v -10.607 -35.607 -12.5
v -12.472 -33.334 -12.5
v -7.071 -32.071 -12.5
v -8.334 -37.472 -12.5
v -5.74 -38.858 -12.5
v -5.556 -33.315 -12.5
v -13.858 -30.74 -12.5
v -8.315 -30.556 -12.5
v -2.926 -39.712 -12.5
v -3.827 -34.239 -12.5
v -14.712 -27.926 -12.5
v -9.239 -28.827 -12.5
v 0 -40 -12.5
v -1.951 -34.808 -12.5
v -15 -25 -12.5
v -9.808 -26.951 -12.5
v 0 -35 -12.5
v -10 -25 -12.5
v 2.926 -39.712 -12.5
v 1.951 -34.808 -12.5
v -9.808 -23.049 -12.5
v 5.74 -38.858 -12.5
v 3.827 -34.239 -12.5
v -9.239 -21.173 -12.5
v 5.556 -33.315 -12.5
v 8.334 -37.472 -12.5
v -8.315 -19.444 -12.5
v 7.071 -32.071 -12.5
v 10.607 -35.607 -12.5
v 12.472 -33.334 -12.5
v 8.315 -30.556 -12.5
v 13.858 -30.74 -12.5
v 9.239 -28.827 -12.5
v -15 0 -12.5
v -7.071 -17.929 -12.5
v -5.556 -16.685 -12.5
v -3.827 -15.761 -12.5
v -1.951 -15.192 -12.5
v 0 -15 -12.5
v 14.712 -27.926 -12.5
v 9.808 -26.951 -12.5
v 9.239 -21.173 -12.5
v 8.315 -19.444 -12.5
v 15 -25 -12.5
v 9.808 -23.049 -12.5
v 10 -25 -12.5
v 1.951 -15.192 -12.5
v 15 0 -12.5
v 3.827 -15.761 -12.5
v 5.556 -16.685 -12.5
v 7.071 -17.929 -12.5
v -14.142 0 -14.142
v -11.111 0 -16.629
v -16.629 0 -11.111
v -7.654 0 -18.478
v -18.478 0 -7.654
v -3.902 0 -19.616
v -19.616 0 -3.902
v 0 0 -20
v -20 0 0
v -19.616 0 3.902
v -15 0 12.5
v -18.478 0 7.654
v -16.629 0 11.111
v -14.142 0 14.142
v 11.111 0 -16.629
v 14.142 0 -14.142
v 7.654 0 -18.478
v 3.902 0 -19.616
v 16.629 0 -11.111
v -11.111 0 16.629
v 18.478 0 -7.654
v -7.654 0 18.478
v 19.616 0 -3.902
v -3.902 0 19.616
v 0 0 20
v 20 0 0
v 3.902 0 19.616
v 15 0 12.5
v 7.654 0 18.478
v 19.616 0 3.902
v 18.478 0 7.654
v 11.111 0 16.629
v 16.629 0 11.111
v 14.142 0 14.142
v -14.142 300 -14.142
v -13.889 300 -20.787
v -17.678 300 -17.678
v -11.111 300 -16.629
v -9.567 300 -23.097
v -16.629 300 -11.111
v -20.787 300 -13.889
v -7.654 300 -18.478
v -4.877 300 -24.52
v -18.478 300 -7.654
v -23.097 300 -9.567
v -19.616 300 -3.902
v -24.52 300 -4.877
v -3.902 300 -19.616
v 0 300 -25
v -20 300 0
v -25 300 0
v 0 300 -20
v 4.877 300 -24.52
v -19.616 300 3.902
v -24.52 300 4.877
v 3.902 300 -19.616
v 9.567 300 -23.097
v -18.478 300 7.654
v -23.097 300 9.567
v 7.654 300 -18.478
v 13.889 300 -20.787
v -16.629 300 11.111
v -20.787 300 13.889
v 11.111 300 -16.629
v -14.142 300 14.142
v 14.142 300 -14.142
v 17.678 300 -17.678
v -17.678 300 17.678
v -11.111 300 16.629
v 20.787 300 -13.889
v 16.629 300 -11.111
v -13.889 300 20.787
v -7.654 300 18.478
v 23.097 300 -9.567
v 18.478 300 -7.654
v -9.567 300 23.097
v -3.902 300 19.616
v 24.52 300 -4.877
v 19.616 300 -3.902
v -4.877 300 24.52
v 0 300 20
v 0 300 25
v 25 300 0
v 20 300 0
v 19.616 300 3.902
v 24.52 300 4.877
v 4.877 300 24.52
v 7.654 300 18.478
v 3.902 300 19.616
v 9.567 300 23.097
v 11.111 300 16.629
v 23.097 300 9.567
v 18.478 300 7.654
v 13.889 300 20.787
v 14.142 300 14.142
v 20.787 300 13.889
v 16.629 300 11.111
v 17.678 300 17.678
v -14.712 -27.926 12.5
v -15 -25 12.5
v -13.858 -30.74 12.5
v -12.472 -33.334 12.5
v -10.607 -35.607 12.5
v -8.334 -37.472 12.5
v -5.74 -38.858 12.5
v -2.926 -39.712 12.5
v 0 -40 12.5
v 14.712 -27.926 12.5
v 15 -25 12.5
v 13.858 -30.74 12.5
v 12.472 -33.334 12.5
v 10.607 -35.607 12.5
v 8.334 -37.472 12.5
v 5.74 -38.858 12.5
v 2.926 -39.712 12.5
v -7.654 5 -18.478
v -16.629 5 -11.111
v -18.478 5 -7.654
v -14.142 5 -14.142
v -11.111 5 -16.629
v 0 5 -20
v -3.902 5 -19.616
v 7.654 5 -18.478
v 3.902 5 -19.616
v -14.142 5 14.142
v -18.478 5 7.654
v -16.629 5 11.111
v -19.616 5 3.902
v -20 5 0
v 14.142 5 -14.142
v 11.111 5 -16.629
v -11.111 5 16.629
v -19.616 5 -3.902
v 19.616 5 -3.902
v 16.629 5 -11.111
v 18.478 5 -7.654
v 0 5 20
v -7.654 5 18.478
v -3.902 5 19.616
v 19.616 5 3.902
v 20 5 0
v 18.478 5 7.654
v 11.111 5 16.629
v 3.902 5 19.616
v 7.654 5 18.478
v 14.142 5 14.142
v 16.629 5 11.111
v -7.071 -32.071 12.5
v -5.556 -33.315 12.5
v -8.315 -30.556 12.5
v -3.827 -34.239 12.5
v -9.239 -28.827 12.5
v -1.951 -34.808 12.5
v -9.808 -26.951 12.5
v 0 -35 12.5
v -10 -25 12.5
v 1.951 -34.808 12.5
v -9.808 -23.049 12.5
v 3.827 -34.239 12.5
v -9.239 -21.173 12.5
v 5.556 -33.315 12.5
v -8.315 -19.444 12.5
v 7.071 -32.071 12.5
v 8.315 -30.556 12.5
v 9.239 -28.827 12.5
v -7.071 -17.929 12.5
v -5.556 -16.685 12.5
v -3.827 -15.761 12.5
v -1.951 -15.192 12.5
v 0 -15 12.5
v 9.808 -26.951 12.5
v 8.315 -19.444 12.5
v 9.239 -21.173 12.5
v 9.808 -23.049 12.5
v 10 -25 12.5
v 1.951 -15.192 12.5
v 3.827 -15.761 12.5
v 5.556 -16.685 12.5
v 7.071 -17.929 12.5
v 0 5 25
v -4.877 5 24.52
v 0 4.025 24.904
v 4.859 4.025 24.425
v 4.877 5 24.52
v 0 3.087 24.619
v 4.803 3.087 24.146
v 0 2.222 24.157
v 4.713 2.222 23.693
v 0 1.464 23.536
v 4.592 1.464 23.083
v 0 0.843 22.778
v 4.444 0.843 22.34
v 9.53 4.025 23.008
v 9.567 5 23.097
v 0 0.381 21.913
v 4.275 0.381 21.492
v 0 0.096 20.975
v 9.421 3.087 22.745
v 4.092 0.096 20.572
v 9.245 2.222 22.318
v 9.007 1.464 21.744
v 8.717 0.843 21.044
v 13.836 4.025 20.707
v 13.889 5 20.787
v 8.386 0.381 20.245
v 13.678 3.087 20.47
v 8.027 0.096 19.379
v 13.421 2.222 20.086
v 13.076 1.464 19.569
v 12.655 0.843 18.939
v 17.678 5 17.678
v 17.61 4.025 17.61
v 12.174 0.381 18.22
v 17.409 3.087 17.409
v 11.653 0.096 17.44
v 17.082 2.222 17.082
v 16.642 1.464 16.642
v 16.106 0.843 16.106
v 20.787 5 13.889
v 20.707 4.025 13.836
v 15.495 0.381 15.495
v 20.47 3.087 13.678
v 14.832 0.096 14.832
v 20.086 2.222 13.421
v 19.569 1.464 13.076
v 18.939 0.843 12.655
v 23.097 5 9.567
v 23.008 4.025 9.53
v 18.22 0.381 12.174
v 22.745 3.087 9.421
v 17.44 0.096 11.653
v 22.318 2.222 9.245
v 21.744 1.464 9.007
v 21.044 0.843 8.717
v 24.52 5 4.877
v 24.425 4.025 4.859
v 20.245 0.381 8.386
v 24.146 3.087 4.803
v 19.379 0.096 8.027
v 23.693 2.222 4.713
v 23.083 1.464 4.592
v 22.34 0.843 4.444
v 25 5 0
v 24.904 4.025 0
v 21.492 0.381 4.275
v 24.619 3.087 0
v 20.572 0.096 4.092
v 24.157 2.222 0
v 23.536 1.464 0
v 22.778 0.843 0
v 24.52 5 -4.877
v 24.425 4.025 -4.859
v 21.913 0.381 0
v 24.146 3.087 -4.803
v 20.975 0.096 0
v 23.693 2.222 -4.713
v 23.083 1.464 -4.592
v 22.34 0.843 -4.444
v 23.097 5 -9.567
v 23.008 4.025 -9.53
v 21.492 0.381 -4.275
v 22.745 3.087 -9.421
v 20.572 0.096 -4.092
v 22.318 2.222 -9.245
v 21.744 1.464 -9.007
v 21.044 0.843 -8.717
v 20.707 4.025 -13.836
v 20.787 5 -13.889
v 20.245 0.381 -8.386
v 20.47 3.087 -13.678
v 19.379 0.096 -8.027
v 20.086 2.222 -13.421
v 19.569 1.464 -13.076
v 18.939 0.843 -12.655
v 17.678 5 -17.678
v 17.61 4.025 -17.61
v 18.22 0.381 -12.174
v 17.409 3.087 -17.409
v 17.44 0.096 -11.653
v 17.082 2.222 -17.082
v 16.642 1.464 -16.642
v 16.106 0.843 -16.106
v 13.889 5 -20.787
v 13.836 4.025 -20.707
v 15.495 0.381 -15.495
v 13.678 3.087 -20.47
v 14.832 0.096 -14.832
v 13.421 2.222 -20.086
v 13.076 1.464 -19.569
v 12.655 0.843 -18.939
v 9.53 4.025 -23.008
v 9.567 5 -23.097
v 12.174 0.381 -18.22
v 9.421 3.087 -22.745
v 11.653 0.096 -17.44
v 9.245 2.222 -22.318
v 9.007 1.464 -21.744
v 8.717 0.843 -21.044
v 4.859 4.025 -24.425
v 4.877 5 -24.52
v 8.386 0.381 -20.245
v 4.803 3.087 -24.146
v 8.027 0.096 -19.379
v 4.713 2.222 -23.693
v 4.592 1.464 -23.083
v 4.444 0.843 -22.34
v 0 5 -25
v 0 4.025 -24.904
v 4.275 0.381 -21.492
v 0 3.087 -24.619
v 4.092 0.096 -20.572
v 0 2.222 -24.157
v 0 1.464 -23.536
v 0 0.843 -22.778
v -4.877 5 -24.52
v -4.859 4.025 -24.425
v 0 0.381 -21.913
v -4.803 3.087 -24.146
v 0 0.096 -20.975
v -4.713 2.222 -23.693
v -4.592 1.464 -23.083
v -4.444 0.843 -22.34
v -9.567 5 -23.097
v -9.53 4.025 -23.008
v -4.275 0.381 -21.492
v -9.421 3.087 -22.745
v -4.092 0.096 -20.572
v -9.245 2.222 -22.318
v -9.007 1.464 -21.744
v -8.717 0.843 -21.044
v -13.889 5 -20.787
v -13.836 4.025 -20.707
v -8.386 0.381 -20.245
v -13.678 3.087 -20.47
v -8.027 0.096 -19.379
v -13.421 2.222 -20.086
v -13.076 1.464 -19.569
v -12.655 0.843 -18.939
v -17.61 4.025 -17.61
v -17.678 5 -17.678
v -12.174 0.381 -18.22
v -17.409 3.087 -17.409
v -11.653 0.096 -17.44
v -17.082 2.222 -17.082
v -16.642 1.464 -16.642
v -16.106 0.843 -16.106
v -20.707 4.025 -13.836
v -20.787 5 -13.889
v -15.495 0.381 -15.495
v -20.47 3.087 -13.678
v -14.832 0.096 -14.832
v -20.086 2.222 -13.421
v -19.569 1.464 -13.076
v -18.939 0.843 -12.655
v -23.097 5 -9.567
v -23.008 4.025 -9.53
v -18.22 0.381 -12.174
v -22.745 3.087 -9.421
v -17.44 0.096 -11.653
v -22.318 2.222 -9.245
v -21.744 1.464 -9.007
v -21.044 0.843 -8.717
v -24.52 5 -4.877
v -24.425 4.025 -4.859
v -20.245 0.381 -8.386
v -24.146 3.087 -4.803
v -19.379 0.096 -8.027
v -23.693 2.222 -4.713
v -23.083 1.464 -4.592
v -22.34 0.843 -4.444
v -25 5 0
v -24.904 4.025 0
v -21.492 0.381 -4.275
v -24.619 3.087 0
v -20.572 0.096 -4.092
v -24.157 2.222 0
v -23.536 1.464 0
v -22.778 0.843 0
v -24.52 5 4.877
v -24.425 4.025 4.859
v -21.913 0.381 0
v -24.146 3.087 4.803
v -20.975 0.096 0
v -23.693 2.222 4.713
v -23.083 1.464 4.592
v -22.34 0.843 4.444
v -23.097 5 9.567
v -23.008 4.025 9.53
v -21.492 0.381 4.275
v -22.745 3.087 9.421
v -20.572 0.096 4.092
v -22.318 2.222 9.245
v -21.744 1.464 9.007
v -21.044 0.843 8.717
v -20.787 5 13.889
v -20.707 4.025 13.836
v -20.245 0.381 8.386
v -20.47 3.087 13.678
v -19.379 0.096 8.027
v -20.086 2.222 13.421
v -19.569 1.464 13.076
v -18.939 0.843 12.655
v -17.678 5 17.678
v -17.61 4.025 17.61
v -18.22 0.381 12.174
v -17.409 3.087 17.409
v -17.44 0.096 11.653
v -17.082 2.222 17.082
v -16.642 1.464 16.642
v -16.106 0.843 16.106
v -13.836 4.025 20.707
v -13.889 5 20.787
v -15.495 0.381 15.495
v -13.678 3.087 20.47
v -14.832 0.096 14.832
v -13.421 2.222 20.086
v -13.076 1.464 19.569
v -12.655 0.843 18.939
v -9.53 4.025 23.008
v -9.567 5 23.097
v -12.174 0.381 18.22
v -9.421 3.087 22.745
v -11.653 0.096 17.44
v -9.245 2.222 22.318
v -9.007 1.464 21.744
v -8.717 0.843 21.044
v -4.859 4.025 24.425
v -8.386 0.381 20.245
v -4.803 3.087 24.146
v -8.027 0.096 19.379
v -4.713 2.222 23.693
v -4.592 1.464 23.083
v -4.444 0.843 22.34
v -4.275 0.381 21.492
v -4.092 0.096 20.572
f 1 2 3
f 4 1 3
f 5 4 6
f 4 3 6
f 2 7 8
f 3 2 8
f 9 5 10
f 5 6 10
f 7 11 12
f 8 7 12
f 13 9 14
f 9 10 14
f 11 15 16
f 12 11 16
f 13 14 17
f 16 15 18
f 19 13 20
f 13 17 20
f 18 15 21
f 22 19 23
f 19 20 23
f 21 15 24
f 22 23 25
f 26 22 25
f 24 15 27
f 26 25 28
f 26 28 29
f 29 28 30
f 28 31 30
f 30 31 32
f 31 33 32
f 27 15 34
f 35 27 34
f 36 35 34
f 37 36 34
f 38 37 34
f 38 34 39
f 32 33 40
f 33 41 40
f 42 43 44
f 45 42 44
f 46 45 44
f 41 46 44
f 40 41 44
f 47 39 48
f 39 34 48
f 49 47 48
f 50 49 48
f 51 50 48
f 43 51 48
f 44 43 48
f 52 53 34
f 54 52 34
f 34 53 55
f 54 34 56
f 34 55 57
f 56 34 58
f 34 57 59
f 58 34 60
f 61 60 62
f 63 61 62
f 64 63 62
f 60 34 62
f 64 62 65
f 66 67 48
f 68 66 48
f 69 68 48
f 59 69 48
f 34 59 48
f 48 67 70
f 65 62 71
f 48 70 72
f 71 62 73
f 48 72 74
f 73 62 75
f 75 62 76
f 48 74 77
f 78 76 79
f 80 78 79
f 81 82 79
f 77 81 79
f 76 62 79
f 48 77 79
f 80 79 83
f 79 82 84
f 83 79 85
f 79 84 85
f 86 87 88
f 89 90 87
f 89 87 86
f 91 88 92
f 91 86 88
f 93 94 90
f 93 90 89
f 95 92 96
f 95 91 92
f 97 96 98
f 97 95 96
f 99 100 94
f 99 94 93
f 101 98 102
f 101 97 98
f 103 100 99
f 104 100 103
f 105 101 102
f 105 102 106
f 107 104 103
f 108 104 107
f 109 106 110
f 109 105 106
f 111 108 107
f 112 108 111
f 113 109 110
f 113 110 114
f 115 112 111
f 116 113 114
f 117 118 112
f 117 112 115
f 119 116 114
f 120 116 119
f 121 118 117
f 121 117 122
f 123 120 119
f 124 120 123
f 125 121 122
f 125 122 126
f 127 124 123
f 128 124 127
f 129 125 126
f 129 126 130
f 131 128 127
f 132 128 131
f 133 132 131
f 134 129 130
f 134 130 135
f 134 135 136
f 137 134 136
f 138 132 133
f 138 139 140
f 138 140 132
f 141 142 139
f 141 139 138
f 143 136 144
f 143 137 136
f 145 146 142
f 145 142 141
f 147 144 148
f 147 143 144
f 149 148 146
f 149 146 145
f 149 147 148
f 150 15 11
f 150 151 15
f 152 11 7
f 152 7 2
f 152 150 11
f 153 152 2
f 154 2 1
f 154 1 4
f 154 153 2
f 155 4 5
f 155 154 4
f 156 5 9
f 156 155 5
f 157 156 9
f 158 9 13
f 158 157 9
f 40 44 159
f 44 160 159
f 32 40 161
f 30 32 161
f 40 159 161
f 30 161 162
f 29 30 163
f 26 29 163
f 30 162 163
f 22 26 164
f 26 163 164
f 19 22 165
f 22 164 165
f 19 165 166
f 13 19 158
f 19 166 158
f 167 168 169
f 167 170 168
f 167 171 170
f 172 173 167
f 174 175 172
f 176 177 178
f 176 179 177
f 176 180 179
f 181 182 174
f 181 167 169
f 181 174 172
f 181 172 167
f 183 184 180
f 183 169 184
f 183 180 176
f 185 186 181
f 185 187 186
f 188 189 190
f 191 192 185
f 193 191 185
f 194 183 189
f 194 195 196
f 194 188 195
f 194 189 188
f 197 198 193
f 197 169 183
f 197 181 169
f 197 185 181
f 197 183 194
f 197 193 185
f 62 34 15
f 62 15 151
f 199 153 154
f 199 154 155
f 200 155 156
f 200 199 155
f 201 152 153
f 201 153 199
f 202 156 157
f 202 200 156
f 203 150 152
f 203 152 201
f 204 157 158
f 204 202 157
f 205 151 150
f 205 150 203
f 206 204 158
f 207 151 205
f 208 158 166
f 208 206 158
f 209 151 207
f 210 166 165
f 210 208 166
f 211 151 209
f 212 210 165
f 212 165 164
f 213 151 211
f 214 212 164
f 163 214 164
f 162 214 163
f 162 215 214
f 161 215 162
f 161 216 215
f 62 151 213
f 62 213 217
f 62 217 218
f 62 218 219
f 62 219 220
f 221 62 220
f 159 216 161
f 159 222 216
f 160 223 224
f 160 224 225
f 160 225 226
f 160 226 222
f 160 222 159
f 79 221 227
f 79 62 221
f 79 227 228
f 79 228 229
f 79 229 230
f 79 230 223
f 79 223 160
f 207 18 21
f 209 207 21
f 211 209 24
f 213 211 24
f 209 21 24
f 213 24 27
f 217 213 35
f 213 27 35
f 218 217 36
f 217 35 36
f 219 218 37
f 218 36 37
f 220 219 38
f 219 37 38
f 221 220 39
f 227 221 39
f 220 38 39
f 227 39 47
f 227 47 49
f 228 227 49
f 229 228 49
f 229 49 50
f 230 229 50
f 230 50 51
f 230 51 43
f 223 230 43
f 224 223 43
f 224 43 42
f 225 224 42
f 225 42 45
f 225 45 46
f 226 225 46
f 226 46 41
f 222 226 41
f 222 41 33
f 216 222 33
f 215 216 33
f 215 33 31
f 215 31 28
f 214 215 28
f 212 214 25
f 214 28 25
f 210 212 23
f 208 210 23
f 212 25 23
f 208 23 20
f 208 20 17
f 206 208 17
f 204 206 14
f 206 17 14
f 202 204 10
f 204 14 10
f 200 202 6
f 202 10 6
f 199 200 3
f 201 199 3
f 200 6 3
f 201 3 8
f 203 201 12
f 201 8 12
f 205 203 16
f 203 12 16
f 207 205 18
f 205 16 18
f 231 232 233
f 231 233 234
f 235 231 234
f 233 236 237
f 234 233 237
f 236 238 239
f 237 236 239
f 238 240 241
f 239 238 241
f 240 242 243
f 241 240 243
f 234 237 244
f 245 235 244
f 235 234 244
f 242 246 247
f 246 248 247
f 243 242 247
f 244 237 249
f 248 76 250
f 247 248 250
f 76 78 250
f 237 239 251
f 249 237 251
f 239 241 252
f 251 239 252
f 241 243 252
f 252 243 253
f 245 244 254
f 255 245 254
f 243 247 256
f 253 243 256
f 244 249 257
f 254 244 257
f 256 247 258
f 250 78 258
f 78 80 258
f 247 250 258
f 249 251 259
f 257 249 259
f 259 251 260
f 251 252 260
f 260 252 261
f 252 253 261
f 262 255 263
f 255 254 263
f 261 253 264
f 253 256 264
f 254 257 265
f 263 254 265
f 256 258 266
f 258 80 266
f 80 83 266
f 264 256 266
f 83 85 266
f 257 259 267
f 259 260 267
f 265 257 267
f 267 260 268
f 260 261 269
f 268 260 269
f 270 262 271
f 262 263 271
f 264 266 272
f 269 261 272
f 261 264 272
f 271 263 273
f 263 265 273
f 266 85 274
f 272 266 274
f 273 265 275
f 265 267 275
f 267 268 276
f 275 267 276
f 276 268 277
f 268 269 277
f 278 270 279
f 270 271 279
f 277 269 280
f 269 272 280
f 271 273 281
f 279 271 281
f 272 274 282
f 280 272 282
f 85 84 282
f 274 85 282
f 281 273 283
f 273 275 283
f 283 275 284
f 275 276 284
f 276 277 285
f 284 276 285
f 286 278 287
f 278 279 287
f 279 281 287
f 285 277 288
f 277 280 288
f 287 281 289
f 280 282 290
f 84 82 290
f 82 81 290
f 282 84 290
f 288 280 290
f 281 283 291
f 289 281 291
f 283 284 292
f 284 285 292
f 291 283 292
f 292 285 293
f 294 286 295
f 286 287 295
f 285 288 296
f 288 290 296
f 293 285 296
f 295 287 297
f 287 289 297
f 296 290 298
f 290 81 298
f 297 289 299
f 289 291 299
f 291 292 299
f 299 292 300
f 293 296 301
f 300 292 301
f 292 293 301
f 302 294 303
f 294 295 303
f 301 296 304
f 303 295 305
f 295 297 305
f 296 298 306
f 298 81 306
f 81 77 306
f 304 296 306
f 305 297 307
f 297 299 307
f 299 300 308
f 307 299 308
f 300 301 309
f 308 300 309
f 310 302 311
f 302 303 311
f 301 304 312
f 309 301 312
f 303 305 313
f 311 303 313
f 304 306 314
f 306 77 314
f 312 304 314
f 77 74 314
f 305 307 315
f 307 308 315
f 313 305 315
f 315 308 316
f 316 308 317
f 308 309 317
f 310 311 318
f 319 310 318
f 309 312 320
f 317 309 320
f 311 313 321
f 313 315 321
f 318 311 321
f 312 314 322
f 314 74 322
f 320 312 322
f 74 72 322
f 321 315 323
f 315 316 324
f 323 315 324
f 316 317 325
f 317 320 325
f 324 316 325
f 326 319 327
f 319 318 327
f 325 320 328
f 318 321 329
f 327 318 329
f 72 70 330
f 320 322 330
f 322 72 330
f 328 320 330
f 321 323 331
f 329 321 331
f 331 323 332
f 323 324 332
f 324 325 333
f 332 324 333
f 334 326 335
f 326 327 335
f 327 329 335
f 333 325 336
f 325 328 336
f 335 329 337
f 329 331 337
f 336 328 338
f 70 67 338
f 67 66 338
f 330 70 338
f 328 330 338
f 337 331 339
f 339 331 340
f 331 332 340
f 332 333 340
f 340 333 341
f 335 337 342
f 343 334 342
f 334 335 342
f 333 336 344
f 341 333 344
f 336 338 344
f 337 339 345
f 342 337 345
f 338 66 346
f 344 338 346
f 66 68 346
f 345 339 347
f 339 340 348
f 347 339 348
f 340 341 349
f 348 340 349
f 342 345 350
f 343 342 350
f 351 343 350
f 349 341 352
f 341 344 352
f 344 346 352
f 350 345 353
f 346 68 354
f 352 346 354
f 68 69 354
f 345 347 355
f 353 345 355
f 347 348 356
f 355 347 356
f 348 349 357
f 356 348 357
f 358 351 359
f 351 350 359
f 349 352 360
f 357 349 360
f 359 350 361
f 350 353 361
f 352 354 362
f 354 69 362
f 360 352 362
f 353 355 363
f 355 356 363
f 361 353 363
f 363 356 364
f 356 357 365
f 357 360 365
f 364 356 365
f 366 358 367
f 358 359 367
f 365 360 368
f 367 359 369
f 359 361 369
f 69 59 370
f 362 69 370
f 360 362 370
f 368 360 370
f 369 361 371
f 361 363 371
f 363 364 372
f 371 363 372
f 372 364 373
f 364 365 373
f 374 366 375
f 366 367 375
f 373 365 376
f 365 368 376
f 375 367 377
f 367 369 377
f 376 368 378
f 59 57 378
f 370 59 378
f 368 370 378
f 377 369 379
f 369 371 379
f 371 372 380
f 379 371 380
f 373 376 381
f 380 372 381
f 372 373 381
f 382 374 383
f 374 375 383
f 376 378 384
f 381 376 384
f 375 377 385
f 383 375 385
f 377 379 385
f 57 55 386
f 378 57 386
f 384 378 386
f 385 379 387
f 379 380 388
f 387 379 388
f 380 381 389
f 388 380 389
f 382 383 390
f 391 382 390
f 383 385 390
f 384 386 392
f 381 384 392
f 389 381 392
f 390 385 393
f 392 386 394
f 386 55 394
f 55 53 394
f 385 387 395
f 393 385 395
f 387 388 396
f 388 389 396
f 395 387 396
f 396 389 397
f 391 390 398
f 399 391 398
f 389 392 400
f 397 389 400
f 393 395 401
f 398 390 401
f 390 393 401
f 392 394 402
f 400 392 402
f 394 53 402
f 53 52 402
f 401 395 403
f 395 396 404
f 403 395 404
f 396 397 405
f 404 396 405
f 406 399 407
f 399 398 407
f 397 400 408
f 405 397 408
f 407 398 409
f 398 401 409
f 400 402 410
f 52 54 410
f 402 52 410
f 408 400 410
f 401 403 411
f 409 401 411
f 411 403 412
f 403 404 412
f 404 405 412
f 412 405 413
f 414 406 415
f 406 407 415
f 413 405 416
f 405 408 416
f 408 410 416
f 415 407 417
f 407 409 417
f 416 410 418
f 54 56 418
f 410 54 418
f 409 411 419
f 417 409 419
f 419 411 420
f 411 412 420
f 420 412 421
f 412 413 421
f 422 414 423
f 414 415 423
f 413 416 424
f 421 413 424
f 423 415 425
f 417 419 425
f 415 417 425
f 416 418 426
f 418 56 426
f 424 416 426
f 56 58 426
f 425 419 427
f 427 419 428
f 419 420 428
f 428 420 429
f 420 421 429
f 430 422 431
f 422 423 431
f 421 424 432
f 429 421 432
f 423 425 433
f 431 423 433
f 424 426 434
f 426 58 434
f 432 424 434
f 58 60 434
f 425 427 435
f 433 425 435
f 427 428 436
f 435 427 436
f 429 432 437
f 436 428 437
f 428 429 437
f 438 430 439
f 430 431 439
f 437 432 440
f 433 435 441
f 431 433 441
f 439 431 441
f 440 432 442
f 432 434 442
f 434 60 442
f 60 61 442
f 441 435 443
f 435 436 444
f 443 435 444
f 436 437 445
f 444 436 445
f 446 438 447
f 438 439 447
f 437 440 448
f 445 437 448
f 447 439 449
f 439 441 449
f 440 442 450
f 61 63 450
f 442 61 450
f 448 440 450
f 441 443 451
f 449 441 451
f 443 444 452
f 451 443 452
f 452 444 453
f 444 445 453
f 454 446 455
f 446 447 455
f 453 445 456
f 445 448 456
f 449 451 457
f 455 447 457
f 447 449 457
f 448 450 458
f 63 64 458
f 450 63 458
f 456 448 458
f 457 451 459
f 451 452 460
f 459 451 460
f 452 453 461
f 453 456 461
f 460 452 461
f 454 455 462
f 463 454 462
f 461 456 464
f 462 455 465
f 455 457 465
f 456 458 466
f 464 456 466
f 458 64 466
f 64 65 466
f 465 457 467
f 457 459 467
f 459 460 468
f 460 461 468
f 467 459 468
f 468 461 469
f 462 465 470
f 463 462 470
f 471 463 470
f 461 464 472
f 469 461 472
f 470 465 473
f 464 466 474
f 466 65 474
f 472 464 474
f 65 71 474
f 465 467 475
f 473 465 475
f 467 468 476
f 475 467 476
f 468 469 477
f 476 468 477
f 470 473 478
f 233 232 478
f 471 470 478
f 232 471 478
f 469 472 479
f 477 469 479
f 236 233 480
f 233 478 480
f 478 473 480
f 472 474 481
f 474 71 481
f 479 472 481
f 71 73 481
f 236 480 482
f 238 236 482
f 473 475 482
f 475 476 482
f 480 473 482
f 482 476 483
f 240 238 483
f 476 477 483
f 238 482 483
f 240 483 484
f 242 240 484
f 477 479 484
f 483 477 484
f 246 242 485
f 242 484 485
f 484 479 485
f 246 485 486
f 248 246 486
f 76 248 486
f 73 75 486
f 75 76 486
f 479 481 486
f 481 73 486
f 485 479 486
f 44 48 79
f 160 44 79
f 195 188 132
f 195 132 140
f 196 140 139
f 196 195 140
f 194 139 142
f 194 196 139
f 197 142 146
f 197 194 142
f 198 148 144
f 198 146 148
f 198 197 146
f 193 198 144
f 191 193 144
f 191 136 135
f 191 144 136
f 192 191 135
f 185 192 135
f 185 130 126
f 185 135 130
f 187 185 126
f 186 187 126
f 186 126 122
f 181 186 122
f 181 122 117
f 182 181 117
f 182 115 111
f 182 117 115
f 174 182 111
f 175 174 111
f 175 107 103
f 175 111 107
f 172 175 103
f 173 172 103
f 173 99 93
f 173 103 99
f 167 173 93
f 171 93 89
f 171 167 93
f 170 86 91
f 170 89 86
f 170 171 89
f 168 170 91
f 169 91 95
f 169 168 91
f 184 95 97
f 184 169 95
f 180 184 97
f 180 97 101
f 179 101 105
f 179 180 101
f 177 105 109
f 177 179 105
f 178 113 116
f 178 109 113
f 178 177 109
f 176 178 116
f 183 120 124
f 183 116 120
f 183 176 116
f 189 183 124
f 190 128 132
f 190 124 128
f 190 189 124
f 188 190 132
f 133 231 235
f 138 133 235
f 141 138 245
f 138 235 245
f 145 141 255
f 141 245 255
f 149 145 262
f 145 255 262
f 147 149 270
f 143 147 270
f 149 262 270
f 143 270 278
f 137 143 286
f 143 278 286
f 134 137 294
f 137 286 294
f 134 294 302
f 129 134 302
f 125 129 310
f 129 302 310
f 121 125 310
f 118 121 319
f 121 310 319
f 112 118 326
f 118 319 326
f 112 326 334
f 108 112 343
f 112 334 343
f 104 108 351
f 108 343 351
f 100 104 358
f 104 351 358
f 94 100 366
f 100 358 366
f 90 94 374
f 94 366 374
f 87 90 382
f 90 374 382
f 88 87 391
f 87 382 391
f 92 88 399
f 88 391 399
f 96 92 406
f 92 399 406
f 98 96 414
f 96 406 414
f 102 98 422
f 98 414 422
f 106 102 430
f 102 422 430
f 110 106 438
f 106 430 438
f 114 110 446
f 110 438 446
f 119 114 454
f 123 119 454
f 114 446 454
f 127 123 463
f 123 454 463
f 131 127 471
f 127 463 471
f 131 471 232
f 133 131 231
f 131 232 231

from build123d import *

# Parameters (mm, degrees)
SKETCH1_R           = 25
BOSS_EXTRUDE1_DEPTH = 300
SHELL1_T            = -5
FILLET1_R           = 5
SKETCH2_W           = 30
SKETCH2_H           = 25
BOSS_EXTRUDE2_DEPTH = 40
SKETCH3_R           = 10
CUT_EXTRUDE1_DEPTH  = 40
FILLET3_R           = 15


with BuildPart() as part:
    # Sketch1 → Boss-Extrude1 (new body)
    with BuildSketch(Plane(origin=(0, 0, 0), x_dir=(1, 0, 0), z_dir=(0, 1, 0))):
        with Locations(Location((0, 0, 0), (0, 0, 270))):
            Circle(SKETCH1_R)
    extrude(amount=BOSS_EXTRUDE1_DEPTH)

    # Shell1
    shell1_openings = [part.faces().sort_by_distance(p)[0] for p in [
        (0, 300, 0),
    ]]
    offset(amount=SHELL1_T, openings=shell1_openings, kind=Kind.INTERSECTION)

    # Fillet1
    fillet1_edges = [part.edges().sort_by_distance(p)[0] for p in [
        (0, 0, -25),
    ]]
    fillet(fillet1_edges, radius=FILLET1_R)

    # Sketch2 → Boss-Extrude2 (add)
    with BuildSketch(Plane.XZ):
        Rectangle(SKETCH2_W, SKETCH2_H)
    extrude(amount=BOSS_EXTRUDE2_DEPTH)

    # Sketch3 → Cut-Extrude1 (cut)
    with BuildSketch(Plane(origin=(0, 0, -12.5), x_dir=(-1, 0, 0), z_dir=(0, 0, -1))):
        with Locations((0, -25)):
            Circle(SKETCH3_R)
    extrude(amount=-CUT_EXTRUDE1_DEPTH, mode=Mode.SUBTRACT)

    # Fillet3
    fillet3_edges = [part.edges().sort_by_distance(p)[0] for p in [
        (-15, -40, 0),
        (15, -40, 0),
    ]]
    fillet(fillet3_edges, radius=FILLET3_R - 0.0001)  # a hair under: the kernel refuses the full size


solid = part.part
